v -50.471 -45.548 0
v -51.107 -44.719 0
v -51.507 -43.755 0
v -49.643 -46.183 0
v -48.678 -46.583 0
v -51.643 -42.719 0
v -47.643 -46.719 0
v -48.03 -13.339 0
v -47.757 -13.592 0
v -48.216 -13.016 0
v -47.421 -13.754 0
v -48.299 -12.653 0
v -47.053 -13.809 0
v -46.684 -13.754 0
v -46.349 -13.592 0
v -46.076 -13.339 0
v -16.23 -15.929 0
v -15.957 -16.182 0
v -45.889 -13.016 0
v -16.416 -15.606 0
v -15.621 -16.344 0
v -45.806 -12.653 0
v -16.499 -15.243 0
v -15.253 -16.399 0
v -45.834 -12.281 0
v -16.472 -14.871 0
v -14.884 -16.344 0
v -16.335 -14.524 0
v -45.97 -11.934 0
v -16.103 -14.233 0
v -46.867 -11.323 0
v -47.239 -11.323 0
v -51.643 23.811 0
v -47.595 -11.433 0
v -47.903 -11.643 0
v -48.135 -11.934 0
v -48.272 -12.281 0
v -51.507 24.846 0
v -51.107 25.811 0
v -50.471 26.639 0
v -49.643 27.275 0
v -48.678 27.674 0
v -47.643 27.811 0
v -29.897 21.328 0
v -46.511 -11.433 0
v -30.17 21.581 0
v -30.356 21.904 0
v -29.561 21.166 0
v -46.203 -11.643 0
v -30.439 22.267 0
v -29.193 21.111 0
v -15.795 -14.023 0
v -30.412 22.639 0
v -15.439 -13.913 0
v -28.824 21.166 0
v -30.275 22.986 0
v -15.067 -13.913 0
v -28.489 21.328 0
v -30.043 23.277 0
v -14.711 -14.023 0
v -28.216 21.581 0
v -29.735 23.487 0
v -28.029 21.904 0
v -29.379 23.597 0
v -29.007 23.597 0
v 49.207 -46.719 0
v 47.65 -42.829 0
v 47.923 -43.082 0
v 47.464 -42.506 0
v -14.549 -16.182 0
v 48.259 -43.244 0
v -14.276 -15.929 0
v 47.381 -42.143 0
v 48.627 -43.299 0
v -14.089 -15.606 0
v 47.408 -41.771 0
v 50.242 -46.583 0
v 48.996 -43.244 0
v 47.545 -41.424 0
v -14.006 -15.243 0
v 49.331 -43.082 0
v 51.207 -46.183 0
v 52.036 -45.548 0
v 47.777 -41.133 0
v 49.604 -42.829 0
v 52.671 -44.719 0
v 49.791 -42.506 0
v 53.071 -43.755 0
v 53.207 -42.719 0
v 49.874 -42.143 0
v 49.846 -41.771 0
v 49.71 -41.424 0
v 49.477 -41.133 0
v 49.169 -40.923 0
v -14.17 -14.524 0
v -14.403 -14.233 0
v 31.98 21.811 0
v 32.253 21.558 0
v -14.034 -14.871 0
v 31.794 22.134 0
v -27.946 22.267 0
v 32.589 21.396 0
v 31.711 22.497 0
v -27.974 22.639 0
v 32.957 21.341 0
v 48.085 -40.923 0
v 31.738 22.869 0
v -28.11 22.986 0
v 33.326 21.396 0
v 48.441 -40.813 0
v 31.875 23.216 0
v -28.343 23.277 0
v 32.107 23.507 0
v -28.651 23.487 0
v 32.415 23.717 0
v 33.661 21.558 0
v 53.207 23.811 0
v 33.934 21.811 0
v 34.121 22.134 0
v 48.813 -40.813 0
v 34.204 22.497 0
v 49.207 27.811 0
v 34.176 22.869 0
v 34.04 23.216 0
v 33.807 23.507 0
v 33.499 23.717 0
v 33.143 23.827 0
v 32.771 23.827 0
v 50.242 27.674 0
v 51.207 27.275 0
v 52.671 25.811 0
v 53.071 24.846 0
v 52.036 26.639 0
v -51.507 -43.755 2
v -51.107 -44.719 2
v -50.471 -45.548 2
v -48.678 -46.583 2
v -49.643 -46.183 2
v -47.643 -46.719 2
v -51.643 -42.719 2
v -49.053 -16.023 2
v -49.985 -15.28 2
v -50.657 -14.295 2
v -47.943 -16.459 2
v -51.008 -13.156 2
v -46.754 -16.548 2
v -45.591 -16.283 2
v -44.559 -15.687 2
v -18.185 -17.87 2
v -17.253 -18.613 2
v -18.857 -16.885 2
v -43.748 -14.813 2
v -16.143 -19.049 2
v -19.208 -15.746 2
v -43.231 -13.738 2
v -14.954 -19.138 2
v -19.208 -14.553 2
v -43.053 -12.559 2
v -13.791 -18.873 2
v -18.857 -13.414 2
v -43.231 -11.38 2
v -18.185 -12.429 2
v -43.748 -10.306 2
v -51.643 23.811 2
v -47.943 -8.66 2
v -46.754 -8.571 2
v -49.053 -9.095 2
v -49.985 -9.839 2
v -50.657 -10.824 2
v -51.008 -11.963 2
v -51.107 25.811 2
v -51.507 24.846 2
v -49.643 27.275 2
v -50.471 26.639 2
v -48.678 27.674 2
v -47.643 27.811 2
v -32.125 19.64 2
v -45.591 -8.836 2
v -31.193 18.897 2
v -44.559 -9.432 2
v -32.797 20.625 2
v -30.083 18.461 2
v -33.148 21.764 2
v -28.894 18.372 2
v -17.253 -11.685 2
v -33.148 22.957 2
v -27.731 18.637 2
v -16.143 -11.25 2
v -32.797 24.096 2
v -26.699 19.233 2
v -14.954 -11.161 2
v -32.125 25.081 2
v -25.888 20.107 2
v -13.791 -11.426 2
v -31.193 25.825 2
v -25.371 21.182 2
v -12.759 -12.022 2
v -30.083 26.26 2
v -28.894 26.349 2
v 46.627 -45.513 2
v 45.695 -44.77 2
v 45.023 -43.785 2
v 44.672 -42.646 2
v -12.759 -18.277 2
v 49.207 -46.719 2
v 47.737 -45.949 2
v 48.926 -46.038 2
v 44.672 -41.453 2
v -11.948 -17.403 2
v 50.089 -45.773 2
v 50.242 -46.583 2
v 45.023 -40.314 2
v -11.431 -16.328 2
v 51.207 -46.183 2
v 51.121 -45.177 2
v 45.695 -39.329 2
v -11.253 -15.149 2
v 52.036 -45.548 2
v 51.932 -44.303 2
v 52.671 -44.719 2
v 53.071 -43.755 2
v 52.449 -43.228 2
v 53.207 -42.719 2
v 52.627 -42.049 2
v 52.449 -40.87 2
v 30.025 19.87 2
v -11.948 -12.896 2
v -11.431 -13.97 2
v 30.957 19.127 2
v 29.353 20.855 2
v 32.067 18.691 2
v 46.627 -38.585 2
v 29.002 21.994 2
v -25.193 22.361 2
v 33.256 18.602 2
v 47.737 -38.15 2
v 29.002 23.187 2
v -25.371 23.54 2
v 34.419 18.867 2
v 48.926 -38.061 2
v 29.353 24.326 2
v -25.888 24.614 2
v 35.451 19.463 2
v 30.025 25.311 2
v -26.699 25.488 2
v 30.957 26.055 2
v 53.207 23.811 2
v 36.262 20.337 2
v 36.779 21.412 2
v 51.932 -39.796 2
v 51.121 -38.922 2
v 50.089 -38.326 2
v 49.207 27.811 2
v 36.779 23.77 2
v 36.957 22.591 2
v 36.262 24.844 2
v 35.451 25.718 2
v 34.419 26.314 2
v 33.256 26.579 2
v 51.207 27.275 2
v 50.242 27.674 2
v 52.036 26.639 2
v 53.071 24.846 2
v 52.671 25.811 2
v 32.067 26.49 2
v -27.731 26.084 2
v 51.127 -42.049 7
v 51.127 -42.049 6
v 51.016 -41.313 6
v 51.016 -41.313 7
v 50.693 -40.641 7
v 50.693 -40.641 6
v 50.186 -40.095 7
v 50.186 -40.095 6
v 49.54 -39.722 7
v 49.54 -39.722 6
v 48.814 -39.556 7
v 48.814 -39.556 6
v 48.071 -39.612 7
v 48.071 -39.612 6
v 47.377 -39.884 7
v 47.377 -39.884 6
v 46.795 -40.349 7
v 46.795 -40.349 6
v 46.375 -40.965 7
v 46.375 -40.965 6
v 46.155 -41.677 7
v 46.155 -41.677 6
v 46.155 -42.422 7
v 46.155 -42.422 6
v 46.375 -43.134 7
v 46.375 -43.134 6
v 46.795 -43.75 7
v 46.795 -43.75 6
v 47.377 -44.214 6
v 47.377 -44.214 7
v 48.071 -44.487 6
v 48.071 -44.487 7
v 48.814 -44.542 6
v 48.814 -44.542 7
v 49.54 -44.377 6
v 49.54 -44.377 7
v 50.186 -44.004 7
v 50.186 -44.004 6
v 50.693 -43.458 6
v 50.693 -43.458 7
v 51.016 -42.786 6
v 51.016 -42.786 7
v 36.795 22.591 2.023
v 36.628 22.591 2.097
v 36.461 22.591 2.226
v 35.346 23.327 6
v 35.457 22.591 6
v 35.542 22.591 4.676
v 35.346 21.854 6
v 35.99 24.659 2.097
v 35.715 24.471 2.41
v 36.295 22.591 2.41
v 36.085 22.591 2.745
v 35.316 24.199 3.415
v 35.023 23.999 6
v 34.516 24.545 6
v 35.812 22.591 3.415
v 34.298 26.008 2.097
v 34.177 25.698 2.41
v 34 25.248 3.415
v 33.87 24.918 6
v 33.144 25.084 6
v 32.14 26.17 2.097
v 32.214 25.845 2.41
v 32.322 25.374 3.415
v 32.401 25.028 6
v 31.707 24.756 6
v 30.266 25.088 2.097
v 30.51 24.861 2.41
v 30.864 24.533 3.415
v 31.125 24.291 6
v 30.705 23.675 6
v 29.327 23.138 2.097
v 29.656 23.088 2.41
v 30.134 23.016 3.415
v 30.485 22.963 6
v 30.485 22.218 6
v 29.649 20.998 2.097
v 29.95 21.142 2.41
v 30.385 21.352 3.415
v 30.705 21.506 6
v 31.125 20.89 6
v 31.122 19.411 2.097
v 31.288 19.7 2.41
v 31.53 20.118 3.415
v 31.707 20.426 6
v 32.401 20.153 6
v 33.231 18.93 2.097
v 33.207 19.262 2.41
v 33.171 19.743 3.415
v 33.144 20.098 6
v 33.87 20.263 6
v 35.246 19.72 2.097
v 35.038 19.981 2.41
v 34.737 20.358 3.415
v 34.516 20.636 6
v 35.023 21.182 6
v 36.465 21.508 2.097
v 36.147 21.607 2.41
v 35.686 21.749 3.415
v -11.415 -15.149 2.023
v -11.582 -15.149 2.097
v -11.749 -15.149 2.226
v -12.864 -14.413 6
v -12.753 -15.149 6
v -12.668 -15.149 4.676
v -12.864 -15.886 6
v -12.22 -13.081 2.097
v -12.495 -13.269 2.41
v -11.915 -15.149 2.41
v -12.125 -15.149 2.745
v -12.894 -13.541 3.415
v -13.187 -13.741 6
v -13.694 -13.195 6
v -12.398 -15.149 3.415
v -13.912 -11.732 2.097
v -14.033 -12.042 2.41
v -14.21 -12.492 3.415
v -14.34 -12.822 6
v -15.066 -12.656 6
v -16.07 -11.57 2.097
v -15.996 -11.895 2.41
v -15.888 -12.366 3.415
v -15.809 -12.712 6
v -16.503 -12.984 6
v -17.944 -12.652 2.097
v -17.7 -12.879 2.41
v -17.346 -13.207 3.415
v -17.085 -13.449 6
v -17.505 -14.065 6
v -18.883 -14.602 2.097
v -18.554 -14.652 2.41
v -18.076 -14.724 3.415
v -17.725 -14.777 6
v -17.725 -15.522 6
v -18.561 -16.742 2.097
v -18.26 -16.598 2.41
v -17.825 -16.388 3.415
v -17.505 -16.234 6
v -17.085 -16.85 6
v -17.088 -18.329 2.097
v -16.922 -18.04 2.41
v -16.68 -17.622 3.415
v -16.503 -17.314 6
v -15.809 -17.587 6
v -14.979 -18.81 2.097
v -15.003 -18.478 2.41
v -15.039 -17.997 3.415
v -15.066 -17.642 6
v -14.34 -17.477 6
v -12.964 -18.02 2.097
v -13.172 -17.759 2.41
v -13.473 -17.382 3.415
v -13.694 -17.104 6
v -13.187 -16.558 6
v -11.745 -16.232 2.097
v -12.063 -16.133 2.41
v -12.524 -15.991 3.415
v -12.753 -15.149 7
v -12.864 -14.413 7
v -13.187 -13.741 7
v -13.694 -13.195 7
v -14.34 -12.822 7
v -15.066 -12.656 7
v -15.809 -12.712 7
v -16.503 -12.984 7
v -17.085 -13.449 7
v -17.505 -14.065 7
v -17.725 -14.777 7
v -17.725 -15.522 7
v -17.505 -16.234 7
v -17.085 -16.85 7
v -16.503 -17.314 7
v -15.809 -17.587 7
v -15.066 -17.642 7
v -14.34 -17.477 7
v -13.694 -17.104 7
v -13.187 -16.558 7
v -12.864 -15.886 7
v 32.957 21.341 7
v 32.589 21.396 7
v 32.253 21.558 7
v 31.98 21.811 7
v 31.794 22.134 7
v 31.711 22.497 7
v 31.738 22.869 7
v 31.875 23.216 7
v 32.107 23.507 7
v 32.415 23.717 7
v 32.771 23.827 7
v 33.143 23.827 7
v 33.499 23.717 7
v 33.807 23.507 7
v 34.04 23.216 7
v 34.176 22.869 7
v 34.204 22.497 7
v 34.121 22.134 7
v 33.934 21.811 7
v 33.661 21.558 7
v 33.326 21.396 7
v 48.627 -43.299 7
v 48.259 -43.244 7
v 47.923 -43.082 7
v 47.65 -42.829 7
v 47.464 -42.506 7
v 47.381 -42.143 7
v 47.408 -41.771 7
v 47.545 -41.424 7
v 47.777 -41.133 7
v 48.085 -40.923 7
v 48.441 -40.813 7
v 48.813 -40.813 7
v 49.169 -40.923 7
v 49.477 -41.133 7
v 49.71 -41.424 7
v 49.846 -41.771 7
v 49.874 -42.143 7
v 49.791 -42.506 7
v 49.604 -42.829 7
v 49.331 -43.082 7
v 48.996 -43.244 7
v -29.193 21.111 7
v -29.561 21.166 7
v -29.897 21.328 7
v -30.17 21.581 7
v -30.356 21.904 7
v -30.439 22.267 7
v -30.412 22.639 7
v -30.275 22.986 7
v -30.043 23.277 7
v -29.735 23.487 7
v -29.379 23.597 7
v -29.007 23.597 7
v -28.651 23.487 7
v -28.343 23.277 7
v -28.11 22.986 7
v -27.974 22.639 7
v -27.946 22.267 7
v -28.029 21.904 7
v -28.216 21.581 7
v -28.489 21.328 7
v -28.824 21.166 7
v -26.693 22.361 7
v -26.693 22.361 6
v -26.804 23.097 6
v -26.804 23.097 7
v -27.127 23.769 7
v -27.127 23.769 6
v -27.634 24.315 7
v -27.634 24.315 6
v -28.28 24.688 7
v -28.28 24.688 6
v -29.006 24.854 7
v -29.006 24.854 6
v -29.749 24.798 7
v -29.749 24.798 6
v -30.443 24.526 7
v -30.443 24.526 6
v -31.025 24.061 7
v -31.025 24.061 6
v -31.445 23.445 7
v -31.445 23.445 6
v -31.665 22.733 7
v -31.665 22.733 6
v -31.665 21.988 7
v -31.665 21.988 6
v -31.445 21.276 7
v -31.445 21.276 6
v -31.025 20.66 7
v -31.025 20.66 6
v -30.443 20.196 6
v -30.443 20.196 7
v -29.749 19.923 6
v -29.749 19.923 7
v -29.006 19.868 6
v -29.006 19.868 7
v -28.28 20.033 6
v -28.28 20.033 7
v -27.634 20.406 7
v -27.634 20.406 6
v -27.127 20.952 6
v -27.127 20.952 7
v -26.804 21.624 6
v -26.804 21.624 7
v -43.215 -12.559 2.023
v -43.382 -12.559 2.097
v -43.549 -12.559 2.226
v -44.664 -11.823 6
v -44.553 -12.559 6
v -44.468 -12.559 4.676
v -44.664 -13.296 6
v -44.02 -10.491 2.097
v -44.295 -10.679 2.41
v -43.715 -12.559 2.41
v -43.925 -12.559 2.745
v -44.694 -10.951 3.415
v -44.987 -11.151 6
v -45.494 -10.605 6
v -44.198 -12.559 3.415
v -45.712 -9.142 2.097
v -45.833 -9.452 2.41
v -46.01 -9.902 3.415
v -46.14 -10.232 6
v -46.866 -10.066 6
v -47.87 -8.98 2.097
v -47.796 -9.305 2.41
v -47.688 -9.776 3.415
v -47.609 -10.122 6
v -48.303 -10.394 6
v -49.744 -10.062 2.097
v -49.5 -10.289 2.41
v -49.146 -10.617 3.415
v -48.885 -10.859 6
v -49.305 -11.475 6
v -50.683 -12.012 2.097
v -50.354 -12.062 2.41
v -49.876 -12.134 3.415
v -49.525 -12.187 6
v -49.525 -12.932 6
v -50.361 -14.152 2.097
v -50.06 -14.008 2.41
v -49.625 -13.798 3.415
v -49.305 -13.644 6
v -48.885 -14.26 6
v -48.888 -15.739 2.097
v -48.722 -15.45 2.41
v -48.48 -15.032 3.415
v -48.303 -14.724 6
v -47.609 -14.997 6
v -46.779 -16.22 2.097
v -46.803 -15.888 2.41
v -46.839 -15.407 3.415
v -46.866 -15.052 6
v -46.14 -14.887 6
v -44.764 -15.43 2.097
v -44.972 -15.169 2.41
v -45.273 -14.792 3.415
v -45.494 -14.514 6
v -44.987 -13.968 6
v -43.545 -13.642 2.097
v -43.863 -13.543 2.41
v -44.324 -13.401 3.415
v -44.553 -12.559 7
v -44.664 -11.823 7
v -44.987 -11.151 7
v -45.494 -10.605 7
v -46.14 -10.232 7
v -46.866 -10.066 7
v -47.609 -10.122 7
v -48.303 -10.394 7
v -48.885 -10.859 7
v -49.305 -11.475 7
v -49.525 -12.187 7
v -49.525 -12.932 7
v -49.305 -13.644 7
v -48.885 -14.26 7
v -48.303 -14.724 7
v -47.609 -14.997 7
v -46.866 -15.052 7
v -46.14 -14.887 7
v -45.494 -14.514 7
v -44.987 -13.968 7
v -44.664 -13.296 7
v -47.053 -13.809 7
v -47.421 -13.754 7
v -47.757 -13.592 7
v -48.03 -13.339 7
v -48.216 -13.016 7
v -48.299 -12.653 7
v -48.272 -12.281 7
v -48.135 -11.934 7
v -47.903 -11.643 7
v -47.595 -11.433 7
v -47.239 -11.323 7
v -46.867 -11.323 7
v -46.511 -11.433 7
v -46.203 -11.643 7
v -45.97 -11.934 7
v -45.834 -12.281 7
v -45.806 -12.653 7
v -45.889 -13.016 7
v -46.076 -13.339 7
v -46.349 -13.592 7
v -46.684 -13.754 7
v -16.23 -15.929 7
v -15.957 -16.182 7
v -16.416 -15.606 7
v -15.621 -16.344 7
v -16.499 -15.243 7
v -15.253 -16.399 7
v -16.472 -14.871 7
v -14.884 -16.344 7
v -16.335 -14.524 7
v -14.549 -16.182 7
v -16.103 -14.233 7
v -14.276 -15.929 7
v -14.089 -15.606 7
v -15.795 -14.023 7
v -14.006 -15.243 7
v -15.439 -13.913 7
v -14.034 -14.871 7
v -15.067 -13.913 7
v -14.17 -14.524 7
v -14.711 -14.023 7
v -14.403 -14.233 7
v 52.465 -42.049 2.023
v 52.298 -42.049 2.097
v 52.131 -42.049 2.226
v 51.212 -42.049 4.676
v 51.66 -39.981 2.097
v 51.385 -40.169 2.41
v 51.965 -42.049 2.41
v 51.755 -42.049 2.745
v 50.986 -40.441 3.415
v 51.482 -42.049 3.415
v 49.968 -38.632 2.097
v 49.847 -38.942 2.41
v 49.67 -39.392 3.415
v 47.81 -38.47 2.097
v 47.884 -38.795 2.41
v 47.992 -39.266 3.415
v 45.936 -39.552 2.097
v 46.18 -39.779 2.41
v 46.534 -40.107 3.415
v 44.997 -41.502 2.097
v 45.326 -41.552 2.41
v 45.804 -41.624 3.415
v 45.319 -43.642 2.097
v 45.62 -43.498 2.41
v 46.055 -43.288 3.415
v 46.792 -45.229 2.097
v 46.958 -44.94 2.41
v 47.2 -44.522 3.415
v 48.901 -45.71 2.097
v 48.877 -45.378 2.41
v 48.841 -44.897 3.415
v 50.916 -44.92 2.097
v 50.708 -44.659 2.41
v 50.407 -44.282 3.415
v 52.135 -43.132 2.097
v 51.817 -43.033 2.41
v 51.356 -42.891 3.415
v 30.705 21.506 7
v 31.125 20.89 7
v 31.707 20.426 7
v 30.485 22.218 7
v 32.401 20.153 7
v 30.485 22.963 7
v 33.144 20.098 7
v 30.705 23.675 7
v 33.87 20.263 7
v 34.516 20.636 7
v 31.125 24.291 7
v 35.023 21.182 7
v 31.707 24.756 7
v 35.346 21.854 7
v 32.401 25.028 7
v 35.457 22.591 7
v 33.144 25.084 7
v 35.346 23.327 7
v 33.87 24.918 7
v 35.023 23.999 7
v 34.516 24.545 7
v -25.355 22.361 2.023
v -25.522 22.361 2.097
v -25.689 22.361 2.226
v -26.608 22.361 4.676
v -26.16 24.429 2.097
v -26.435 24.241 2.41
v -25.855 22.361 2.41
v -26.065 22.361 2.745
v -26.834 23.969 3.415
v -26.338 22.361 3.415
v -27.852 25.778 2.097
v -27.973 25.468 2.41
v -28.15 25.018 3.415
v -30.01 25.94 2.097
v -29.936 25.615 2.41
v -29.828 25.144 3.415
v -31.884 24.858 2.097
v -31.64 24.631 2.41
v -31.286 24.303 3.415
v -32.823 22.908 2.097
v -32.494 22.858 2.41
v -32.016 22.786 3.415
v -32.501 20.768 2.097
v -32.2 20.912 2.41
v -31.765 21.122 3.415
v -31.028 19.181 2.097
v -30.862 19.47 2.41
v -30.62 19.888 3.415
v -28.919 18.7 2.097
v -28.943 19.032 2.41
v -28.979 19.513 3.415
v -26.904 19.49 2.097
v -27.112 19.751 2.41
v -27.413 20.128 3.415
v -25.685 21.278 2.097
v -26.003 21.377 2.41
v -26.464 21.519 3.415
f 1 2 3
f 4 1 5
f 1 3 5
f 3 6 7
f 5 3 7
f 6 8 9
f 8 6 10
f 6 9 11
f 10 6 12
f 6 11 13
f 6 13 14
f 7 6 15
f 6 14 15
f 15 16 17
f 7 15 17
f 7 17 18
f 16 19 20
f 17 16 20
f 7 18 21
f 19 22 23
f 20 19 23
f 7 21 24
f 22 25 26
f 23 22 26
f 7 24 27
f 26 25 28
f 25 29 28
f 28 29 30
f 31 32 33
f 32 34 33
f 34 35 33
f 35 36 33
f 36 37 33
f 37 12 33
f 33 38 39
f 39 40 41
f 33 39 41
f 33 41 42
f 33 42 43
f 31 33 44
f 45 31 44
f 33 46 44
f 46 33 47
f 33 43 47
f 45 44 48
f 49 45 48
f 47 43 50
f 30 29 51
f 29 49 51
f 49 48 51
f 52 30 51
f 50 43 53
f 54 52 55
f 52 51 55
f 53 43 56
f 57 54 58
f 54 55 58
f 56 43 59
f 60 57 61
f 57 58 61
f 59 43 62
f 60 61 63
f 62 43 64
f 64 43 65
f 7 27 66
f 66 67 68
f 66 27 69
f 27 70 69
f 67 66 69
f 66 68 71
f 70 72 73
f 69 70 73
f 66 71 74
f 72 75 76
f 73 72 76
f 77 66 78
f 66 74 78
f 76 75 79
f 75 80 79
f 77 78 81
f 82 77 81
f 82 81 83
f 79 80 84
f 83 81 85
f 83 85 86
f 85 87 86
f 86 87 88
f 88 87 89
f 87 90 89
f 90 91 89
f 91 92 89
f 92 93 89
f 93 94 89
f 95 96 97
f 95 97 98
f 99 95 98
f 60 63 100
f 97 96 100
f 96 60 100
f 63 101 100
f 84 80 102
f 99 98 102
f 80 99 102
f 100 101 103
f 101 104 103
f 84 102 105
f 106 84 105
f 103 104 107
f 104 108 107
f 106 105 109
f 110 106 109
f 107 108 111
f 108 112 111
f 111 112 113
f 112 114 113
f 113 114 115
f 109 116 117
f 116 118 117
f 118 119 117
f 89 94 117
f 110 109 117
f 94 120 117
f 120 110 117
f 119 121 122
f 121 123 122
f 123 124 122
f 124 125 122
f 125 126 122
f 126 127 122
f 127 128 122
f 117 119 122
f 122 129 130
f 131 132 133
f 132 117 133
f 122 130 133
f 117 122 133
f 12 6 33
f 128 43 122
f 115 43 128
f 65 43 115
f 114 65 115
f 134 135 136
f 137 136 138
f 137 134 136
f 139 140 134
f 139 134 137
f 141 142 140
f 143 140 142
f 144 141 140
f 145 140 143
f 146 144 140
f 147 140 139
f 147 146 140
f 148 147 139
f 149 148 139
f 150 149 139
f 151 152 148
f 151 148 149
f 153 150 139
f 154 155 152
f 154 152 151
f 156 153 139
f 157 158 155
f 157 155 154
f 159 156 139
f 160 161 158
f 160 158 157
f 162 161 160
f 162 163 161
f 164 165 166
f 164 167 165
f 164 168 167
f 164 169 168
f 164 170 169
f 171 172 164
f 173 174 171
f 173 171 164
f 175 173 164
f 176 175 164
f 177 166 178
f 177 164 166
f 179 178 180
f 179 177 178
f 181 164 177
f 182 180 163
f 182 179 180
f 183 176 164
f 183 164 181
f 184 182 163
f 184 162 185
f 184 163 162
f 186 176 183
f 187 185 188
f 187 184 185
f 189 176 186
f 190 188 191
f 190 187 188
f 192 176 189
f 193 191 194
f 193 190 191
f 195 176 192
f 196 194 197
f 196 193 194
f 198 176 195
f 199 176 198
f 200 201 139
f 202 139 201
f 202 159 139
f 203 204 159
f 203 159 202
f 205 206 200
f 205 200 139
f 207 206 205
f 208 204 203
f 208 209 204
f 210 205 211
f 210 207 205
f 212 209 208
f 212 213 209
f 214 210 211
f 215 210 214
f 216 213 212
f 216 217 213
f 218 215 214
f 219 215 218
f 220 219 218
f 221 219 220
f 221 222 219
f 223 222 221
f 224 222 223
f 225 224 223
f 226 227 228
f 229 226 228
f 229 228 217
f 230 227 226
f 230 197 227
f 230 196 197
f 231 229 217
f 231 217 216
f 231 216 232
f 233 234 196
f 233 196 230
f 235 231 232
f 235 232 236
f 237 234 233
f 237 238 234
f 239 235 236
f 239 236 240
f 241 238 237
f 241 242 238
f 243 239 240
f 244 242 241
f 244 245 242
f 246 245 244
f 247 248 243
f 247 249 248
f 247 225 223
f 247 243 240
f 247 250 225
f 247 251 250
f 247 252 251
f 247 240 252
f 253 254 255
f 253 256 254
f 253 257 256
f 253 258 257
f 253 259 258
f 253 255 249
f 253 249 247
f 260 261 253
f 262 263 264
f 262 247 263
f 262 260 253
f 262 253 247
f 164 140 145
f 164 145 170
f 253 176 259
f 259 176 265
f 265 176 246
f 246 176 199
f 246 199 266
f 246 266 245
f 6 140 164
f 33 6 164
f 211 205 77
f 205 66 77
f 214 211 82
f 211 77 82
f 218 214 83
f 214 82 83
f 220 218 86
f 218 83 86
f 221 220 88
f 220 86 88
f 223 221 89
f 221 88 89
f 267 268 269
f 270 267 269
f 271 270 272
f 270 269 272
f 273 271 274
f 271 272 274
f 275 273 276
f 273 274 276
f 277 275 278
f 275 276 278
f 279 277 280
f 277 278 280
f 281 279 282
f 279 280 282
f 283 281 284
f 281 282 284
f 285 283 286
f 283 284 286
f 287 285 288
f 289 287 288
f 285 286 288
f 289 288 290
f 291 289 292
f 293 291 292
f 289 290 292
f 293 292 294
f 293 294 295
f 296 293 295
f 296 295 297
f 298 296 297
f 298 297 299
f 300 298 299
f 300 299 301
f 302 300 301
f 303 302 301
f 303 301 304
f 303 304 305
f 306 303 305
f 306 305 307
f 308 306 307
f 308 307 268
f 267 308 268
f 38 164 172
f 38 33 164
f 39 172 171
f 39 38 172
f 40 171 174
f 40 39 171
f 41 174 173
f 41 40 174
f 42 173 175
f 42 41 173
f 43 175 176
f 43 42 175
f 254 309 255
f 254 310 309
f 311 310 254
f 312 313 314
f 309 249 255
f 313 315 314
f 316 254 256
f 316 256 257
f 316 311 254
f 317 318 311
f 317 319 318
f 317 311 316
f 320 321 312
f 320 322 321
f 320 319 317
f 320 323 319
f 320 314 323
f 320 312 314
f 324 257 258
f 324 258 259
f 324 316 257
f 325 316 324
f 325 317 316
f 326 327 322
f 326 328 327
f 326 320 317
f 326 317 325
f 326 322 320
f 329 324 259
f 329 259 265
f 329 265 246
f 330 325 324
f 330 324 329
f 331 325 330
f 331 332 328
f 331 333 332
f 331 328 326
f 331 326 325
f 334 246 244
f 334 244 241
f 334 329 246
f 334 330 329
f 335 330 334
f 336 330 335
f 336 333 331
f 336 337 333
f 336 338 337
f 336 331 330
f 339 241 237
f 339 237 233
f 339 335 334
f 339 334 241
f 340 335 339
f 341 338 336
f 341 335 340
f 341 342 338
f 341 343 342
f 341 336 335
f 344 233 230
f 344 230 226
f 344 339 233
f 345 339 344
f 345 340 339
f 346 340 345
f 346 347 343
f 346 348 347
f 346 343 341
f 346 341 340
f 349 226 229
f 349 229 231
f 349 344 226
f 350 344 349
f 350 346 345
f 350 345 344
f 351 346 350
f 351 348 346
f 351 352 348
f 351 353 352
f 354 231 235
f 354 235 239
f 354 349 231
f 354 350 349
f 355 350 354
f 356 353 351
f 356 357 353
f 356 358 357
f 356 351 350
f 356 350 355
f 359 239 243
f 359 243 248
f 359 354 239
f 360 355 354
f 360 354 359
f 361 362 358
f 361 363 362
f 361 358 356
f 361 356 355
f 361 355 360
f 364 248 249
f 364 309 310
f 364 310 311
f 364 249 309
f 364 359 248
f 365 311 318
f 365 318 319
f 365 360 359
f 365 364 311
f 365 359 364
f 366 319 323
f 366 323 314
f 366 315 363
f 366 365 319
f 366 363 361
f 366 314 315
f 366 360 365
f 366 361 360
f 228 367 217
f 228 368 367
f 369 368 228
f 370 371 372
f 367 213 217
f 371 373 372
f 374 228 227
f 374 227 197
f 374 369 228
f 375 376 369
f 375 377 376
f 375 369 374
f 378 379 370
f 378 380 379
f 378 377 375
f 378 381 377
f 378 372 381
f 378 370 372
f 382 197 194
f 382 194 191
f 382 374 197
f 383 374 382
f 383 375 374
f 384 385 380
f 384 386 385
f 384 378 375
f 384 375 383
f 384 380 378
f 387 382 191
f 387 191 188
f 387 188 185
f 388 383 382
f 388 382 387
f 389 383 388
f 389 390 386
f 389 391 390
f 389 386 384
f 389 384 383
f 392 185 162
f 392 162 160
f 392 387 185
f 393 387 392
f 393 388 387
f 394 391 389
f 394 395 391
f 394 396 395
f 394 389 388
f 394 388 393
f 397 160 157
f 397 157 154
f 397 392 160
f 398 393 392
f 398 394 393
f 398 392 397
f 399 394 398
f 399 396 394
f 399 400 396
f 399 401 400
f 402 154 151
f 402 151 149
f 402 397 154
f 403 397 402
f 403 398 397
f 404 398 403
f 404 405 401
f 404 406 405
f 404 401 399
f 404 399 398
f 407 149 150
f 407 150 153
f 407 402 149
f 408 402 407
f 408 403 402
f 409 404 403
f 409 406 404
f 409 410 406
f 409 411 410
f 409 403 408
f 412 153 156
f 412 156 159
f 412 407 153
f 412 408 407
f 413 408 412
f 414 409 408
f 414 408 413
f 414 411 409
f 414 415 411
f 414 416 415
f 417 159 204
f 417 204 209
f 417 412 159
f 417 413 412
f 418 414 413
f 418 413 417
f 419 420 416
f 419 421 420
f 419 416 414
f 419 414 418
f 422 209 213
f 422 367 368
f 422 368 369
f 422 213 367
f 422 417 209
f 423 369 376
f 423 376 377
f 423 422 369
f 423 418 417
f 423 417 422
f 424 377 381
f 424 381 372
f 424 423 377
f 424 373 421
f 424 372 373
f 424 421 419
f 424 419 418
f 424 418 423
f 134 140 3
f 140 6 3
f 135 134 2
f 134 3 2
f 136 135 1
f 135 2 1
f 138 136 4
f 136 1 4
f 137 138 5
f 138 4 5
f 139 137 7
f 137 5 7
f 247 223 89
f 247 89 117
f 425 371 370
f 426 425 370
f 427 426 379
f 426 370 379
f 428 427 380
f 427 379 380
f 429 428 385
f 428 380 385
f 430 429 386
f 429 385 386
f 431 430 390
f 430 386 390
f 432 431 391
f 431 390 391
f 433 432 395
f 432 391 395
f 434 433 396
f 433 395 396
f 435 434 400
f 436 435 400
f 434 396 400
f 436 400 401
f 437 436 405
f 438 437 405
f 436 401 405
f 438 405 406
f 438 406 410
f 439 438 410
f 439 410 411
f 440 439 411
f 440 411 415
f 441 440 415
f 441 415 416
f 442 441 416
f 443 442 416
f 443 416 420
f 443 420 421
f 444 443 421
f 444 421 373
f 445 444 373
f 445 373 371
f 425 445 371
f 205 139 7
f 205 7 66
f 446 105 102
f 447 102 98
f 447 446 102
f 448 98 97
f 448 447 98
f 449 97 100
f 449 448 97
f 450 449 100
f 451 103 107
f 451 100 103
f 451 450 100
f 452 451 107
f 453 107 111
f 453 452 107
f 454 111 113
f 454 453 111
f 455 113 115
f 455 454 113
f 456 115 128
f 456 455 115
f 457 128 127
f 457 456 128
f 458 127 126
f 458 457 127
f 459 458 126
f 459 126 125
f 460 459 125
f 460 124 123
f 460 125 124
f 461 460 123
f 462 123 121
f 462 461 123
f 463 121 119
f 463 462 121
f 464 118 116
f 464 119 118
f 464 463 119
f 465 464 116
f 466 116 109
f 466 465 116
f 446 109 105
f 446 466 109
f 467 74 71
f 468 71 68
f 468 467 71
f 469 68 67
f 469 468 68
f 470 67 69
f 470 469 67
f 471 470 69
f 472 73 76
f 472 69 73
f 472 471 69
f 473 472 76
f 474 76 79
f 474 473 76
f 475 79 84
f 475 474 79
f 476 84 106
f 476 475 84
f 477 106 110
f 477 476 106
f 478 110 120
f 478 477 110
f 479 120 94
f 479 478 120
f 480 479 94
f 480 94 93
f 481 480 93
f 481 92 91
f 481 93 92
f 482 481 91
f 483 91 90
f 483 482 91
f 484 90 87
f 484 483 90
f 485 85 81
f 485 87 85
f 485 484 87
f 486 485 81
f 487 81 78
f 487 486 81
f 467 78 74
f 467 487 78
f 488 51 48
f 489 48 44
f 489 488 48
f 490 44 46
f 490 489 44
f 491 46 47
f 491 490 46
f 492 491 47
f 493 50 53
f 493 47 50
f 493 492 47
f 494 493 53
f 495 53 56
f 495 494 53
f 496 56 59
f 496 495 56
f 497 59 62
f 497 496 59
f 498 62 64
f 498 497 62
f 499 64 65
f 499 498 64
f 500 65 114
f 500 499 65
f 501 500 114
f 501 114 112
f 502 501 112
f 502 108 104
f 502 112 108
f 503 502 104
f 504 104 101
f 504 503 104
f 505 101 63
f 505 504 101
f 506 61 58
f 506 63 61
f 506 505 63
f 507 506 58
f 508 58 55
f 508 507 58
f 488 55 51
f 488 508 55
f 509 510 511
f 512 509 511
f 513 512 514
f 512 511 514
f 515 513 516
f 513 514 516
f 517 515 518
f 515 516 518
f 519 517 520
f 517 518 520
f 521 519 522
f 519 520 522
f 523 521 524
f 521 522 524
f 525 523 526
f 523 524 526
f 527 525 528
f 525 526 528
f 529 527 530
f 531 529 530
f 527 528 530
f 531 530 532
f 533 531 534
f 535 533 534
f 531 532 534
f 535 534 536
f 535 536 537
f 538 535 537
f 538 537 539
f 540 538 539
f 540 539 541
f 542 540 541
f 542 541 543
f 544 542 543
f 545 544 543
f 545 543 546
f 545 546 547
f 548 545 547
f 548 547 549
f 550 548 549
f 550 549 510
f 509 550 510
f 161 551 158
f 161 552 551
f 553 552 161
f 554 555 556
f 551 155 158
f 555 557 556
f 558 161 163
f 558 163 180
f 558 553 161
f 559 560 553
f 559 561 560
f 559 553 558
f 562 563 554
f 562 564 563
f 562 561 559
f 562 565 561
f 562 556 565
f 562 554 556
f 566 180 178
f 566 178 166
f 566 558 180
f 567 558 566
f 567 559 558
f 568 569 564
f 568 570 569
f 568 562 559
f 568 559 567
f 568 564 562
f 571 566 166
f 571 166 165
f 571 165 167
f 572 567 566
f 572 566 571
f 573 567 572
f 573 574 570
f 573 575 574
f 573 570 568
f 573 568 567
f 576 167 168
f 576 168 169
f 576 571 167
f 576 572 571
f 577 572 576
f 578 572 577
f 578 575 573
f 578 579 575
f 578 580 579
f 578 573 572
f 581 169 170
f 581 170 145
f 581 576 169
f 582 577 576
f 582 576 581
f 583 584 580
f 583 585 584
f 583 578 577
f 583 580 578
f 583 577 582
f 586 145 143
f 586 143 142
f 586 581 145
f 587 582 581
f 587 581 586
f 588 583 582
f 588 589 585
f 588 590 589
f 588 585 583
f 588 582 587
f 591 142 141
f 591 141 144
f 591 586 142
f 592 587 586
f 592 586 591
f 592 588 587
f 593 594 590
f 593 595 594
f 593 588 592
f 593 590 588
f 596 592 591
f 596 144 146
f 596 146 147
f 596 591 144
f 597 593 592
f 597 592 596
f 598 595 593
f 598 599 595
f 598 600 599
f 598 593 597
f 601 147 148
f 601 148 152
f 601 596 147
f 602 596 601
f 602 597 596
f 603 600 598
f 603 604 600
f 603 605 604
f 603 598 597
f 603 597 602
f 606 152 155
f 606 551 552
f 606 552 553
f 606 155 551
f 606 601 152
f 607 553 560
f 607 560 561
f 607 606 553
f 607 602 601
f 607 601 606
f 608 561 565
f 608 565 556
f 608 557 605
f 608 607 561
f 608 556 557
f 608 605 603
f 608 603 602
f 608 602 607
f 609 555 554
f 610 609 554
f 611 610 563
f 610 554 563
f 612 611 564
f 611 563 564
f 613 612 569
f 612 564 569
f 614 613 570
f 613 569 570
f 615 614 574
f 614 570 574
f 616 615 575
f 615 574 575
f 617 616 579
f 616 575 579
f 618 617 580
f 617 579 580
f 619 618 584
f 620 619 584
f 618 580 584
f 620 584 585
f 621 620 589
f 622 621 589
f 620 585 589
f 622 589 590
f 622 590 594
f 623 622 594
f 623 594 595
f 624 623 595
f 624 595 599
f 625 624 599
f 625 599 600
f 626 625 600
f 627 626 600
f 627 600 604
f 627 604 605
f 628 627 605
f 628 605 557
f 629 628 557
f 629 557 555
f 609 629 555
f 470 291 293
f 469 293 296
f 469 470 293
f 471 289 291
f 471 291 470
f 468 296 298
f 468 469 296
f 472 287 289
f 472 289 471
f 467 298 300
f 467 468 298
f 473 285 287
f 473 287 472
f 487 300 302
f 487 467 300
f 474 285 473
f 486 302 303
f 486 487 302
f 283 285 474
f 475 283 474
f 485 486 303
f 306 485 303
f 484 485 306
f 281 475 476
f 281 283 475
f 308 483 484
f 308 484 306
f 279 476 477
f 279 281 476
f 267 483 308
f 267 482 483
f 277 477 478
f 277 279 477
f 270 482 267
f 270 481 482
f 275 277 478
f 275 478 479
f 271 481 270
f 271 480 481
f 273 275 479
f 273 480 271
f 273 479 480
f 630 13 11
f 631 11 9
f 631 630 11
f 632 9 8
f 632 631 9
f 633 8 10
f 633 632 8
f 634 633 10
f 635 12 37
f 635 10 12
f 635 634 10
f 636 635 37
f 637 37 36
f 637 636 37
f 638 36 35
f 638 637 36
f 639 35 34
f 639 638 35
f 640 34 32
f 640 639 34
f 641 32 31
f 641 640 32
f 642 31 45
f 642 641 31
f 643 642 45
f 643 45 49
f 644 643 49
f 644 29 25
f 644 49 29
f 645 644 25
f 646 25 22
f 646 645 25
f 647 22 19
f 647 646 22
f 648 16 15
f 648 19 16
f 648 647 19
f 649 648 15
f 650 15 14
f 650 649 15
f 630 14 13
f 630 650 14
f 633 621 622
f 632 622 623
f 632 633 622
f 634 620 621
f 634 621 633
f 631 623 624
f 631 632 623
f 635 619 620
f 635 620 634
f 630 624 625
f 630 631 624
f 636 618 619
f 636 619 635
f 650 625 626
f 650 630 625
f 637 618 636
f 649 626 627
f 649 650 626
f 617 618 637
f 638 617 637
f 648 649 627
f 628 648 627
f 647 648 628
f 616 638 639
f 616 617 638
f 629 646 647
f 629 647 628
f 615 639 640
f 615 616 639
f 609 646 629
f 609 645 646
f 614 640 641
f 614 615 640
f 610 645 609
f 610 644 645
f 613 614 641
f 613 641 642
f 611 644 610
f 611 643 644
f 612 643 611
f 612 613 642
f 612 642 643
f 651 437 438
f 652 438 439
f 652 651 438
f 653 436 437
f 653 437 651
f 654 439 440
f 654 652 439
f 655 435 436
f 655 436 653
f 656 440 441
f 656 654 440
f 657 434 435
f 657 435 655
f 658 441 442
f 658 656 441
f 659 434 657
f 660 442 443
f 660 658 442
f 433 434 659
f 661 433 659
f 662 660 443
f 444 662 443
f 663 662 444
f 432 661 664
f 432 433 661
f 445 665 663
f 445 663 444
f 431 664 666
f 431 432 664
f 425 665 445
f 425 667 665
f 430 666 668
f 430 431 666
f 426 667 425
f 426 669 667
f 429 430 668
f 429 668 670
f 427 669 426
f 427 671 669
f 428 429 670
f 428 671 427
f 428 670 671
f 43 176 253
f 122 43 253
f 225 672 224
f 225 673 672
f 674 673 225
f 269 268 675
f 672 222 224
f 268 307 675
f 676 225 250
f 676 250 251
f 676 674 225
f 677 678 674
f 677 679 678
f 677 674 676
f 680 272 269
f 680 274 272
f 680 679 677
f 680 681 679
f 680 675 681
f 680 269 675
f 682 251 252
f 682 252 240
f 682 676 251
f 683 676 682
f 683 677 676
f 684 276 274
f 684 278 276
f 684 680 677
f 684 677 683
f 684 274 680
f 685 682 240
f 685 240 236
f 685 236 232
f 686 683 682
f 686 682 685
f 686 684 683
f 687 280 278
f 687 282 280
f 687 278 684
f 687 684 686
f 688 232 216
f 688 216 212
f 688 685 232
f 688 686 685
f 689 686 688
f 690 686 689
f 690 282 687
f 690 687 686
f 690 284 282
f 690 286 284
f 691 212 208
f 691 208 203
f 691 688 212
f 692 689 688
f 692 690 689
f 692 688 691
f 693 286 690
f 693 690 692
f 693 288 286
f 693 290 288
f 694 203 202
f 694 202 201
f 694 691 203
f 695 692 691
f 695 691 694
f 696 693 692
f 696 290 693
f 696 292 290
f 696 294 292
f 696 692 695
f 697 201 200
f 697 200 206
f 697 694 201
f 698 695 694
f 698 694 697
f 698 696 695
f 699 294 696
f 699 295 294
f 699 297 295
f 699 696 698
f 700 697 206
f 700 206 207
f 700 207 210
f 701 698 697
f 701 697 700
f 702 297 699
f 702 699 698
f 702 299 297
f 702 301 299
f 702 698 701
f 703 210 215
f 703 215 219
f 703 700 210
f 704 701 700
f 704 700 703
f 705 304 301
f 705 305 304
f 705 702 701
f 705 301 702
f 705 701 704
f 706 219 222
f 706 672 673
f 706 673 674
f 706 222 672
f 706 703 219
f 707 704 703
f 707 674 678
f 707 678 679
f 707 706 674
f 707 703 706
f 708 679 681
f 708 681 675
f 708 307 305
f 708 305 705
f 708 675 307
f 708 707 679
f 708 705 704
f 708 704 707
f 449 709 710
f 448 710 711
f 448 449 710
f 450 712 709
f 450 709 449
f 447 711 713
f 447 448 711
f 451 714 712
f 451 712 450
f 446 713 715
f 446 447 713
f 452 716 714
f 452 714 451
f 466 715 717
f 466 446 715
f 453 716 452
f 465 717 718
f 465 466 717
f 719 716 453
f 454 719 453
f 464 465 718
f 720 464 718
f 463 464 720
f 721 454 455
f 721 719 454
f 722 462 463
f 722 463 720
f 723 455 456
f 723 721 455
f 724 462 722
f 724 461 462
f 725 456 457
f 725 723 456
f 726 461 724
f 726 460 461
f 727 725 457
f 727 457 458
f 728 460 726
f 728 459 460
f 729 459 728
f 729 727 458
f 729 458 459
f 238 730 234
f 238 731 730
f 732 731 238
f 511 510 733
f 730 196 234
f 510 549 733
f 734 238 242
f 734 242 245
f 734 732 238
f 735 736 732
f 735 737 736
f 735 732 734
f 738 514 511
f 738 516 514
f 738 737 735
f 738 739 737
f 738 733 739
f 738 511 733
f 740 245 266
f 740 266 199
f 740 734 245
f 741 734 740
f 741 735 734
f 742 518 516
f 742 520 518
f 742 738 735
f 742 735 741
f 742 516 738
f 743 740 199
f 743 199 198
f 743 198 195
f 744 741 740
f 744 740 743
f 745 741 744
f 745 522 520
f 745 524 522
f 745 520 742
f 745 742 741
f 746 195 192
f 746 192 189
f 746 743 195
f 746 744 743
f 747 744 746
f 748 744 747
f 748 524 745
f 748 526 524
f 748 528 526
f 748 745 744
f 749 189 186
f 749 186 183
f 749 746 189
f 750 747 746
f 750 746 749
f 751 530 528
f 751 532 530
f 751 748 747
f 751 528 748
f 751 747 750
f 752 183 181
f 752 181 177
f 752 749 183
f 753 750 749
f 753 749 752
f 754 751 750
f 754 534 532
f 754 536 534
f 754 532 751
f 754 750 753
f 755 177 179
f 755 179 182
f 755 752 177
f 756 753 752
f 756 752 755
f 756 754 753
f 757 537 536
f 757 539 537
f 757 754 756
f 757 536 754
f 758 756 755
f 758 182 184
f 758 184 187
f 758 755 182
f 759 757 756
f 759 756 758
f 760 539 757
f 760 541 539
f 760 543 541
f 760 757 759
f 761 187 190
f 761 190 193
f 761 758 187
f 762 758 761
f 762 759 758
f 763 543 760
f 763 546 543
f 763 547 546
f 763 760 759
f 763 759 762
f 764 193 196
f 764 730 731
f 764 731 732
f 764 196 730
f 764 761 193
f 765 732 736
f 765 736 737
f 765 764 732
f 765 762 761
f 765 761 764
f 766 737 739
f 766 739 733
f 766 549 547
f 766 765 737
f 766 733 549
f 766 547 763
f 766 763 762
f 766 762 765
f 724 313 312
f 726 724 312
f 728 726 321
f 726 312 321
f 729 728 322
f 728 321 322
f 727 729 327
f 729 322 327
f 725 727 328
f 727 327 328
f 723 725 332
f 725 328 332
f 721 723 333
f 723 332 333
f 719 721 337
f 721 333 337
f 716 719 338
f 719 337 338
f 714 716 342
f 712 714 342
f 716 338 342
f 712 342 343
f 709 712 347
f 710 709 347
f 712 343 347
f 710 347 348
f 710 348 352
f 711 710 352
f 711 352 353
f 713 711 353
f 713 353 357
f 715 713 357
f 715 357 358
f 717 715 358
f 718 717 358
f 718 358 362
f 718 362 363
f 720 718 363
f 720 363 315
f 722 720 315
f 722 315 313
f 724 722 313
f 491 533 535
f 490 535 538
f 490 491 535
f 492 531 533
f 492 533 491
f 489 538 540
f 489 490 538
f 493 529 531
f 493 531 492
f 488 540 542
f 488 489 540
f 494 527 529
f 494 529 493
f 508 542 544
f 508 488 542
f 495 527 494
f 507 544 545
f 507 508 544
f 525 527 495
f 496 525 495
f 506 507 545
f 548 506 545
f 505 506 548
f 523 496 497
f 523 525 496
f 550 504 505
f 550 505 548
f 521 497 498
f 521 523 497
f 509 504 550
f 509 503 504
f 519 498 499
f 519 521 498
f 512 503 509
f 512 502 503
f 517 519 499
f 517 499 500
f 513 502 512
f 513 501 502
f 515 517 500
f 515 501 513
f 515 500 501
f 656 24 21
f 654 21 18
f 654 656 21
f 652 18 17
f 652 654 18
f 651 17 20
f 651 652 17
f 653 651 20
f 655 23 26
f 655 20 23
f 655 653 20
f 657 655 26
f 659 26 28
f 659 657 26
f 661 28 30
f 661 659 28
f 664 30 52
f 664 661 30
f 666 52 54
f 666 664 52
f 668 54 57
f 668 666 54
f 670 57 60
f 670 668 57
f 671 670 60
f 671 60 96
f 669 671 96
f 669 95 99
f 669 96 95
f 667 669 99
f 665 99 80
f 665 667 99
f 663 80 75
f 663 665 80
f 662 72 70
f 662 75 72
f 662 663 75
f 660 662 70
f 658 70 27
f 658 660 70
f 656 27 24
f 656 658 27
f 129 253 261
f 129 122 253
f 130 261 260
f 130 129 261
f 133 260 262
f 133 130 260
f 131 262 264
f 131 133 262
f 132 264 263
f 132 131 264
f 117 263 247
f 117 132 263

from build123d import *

# Parameters (mm, degrees)
SKETCH1_W           = 100.85
SKETCH1_H           = 70.53
BOSS_EXTRUDE1_DEPTH = 2
SKETCH6_W           = 104.85
SKETCH6_H           = 74.53
BOSS_EXTRUDE3_DEPTH = 2
SKETCH3_R           = 2.5
BOSS_EXTRUDE2_DEPTH = 5
FILLET1_SIZE        = 1.5
FILLET1_SIZE_2      = 4
FILLET2_R           = 4


with BuildPart() as part:
    # Sketch1 → Boss-Extrude1 (new body)
    with BuildSketch(Plane.XY):
        with Locations((0.782139599, -9.454393248)):
            Rectangle(SKETCH1_W, SKETCH1_H)
    extrude(amount=BOSS_EXTRUDE1_DEPTH)

    # Sketch6 → Boss-Extrude3 (add)
    with BuildSketch(Plane.XY.offset(2)):
        with Locations((0.782139599, -9.454393248)):
            Rectangle(SKETCH6_W, SKETCH6_H)
    extrude(amount=-BOSS_EXTRUDE3_DEPTH)

    # Sketch3 → Boss-Extrude2 (add)
    with BuildSketch(Plane.XY.offset(2)):
        with Locations((-29.192860401, 22.360606752)):
            Circle(SKETCH3_R)
    boss_extrude2 = extrude(amount=BOSS_EXTRUDE2_DEPTH)

    # Sketch5 → Tap Drill for M3x0.5 Tap1 (revolve, cut)
    with BuildSketch(Plane(origin=(-29.192860401, 22.360606752, 7), x_dir=(0, -1, 0), z_dir=(1, 0, 0))):
        Polygon((0, 0), (0, 10.751075774), (1.25, 10), (1.25, 0), align=None)
    tap_drill_for_m3x0_5_tap1 = revolve(axis=Axis((-29.192860401, 22.360606752, 13.35), (0, 0, -1)), mode=Mode.SUBTRACT)

    # Sketch-Pattern1: Boss-Extrude2, Tap Drill for M3x0.5 Tap1 at 4 more places
    with Locations((-17.86, -34.92, 0), (13.94, -37.51, 0), (77.82, -64.41, 0), (62.15, 0.23, 0)):
        add(boss_extrude2)
        add(tap_drill_for_m3x0_5_tap1, mode=Mode.SUBTRACT)

    # Fillet1
    # an asymmetric fillet: 4, 1.5 mm, written as the material it adds along each edge
    with BuildSketch(Plane(origin=(-29.192860401, 22.360606752, 2), x_dir=(1, 0, 0), z_dir=(0, -1, 0))) as fillet1_piece_1:
        with BuildLine():
            Bezier((2.5 + FILLET1_SIZE, 0), (2.5, 0), (2.5, FILLET1_SIZE_2), weights=[1, 0.707106781, 1])
            Line((2.5, FILLET1_SIZE_2), (2.5, 0))
            Line((2.5, 0), (2.5 + FILLET1_SIZE, 0))
        make_face()
    revolve(axis=Axis((-29.192860401, 22.360606752, 2), (0, 0, 1)))
    with BuildSketch(Plane(origin=(-47.052860401, -12.559393248, 2), x_dir=(1, 0, 0), z_dir=(0, -1, 0))) as fillet1_piece_2:
        with BuildLine():
            Bezier((2.5 + FILLET1_SIZE, 0), (2.5, 0), (2.5, FILLET1_SIZE_2), weights=[1, 0.707106781, 1])
            Line((2.5, FILLET1_SIZE_2), (2.5, 0))
            Line((2.5, 0), (2.5 + FILLET1_SIZE, 0))
        make_face()
    revolve(axis=Axis((-47.052860401, -12.559393248, 2), (0, 0, 1)))
    with BuildSketch(Plane(origin=(-15.252860401, -15.149393248, 2), x_dir=(1, 0, 0), z_dir=(0, -1, 0))) as fillet1_piece_3:
        with BuildLine():
            Bezier((2.5 + FILLET1_SIZE, 0), (2.5, 0), (2.5, FILLET1_SIZE_2), weights=[1, 0.707106781, 1])
            Line((2.5, FILLET1_SIZE_2), (2.5, 0))
            Line((2.5, 0), (2.5 + FILLET1_SIZE, 0))
        make_face()
    revolve(axis=Axis((-15.252860401, -15.149393248, 2), (0, 0, 1)))
    with BuildSketch(Plane(origin=(48.627139599, -42.049393248, 2), x_dir=(1, 0, 0), z_dir=(0, -1, 0))) as fillet1_piece_4:
        with BuildLine():
            Bezier((2.5 + FILLET1_SIZE, 0), (2.5, 0), (2.5, FILLET1_SIZE_2), weights=[1, 0.707106781, 1])
            Line((2.5, FILLET1_SIZE_2), (2.5, 0))
            Line((2.5, 0), (2.5 + FILLET1_SIZE, 0))
        make_face()
    revolve(axis=Axis((48.627139599, -42.049393248, 2), (0, 0, 1)))
    with BuildSketch(Plane(origin=(32.957139599, 22.590606752, 2), x_dir=(1, 0, 0), z_dir=(0, -1, 0))) as fillet1_piece_5:
        with BuildLine():
            Bezier((2.5 + FILLET1_SIZE, 0), (2.5, 0), (2.5, FILLET1_SIZE_2), weights=[1, 0.707106781, 1])
            Line((2.5, FILLET1_SIZE_2), (2.5, 0))
            Line((2.5, 0), (2.5 + FILLET1_SIZE, 0))
        make_face()
    revolve(axis=Axis((32.957139599, 22.590606752, 2), (0, 0, 1)))

    # Fillet2
    fillet2_edges = [part.edges().sort_by_distance(p)[0] for p in [
        (-51.642860401, 27.810606752, 1),
        (53.207139599, 27.810606752, 1),
        (53.207139599, -46.719393248, 1),
        (-51.642860401, -46.719393248, 1),
    ]]
    fillet(fillet2_edges, radius=FILLET2_R)


solid = part.part
